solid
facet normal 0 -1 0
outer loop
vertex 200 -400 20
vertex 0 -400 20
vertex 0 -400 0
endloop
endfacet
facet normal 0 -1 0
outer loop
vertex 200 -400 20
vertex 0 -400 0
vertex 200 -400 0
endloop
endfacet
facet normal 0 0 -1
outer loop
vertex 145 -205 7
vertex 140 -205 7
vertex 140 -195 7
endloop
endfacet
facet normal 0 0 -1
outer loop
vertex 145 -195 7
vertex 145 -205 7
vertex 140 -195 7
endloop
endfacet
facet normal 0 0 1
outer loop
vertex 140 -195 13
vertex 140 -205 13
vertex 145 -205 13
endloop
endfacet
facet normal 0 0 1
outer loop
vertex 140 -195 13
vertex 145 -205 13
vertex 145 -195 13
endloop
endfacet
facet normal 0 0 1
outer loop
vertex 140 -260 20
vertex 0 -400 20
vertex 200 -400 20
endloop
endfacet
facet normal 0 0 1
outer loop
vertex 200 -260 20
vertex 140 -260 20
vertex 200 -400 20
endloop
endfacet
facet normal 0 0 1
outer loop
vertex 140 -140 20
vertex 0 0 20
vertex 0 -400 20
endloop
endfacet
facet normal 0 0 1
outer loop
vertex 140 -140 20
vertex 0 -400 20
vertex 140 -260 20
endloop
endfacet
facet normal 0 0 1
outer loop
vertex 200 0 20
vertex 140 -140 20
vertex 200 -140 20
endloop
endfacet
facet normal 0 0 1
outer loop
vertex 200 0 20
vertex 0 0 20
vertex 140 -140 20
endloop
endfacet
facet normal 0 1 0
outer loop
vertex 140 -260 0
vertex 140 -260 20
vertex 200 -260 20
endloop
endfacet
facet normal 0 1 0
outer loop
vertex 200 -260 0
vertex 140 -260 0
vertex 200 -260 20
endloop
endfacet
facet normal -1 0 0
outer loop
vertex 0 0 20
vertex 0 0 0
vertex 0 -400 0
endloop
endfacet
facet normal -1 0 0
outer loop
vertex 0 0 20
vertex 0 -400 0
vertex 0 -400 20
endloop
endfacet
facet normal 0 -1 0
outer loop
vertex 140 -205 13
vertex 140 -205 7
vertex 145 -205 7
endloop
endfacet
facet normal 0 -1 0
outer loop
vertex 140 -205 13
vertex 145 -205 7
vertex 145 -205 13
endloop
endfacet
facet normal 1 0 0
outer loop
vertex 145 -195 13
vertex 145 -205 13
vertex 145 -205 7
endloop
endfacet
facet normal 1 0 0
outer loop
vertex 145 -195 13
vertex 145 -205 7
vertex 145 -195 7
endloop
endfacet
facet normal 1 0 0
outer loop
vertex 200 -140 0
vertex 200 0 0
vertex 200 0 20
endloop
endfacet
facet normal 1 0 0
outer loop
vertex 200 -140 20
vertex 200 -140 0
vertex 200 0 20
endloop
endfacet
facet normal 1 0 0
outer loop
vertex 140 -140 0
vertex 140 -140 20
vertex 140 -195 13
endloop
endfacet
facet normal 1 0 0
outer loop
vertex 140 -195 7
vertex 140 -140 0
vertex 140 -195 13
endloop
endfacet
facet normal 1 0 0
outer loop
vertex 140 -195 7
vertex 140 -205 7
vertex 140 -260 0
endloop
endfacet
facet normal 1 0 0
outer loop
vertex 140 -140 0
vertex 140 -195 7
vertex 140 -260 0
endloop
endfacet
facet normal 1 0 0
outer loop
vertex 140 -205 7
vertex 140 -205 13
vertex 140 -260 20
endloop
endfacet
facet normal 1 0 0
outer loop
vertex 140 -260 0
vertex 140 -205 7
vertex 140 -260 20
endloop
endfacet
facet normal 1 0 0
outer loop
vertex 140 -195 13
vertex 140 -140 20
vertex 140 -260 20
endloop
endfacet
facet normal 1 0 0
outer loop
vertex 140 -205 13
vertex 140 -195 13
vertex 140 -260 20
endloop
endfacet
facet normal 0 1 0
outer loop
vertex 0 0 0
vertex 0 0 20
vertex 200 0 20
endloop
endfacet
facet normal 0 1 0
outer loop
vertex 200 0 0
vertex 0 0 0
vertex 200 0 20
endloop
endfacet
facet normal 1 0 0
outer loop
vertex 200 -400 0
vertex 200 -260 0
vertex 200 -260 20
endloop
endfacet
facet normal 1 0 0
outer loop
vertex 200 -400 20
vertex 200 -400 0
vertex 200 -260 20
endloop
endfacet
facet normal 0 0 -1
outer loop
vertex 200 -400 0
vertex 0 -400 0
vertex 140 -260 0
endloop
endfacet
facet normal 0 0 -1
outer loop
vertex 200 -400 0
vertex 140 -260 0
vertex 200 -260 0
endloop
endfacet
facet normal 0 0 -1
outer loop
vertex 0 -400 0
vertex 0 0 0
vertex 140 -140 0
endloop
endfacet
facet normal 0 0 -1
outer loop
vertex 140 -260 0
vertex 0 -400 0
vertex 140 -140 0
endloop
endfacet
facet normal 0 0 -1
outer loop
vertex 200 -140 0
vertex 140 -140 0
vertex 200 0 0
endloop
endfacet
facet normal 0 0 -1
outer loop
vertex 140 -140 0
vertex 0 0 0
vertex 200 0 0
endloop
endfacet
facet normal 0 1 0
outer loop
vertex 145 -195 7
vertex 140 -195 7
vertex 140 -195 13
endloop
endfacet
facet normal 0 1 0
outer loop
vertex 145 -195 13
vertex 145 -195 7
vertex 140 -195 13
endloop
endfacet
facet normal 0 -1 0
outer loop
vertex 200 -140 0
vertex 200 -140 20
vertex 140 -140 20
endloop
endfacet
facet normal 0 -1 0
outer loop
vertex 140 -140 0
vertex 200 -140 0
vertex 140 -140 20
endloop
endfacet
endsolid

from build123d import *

# Parameters (mm, degrees)
F0_W     = 200
F0_H     = 20
F1_DEPTH = 400
F3_DEPTH = 25
F4_W     = 10
F4_H     = 6
F5_DEPTH = 5


with BuildPart() as f1:
    # F0 (on Front) → F1 (new body)
    with BuildSketch(Plane.XZ):
        with Locations((100, 10)):
            Rectangle(F0_W, F0_H)
    extrude(amount=F1_DEPTH)

    # F2 (on face) → F3 (cut)
    with BuildSketch(Plane.XY.offset(20)):
        Polygon((200, -260), (200, -200), (200, -140), (140, -140), (140, -260), align=None)
    extrude(amount=-F3_DEPTH, mode=Mode.SUBTRACT)

    # F4 (on face) → F5 (join)
    with BuildSketch(Plane.YZ.offset(140)):
        with Locations((-200, 10)):
            Rectangle(F4_W, F4_H)
    extrude(amount=F5_DEPTH)


solid = f1.part
